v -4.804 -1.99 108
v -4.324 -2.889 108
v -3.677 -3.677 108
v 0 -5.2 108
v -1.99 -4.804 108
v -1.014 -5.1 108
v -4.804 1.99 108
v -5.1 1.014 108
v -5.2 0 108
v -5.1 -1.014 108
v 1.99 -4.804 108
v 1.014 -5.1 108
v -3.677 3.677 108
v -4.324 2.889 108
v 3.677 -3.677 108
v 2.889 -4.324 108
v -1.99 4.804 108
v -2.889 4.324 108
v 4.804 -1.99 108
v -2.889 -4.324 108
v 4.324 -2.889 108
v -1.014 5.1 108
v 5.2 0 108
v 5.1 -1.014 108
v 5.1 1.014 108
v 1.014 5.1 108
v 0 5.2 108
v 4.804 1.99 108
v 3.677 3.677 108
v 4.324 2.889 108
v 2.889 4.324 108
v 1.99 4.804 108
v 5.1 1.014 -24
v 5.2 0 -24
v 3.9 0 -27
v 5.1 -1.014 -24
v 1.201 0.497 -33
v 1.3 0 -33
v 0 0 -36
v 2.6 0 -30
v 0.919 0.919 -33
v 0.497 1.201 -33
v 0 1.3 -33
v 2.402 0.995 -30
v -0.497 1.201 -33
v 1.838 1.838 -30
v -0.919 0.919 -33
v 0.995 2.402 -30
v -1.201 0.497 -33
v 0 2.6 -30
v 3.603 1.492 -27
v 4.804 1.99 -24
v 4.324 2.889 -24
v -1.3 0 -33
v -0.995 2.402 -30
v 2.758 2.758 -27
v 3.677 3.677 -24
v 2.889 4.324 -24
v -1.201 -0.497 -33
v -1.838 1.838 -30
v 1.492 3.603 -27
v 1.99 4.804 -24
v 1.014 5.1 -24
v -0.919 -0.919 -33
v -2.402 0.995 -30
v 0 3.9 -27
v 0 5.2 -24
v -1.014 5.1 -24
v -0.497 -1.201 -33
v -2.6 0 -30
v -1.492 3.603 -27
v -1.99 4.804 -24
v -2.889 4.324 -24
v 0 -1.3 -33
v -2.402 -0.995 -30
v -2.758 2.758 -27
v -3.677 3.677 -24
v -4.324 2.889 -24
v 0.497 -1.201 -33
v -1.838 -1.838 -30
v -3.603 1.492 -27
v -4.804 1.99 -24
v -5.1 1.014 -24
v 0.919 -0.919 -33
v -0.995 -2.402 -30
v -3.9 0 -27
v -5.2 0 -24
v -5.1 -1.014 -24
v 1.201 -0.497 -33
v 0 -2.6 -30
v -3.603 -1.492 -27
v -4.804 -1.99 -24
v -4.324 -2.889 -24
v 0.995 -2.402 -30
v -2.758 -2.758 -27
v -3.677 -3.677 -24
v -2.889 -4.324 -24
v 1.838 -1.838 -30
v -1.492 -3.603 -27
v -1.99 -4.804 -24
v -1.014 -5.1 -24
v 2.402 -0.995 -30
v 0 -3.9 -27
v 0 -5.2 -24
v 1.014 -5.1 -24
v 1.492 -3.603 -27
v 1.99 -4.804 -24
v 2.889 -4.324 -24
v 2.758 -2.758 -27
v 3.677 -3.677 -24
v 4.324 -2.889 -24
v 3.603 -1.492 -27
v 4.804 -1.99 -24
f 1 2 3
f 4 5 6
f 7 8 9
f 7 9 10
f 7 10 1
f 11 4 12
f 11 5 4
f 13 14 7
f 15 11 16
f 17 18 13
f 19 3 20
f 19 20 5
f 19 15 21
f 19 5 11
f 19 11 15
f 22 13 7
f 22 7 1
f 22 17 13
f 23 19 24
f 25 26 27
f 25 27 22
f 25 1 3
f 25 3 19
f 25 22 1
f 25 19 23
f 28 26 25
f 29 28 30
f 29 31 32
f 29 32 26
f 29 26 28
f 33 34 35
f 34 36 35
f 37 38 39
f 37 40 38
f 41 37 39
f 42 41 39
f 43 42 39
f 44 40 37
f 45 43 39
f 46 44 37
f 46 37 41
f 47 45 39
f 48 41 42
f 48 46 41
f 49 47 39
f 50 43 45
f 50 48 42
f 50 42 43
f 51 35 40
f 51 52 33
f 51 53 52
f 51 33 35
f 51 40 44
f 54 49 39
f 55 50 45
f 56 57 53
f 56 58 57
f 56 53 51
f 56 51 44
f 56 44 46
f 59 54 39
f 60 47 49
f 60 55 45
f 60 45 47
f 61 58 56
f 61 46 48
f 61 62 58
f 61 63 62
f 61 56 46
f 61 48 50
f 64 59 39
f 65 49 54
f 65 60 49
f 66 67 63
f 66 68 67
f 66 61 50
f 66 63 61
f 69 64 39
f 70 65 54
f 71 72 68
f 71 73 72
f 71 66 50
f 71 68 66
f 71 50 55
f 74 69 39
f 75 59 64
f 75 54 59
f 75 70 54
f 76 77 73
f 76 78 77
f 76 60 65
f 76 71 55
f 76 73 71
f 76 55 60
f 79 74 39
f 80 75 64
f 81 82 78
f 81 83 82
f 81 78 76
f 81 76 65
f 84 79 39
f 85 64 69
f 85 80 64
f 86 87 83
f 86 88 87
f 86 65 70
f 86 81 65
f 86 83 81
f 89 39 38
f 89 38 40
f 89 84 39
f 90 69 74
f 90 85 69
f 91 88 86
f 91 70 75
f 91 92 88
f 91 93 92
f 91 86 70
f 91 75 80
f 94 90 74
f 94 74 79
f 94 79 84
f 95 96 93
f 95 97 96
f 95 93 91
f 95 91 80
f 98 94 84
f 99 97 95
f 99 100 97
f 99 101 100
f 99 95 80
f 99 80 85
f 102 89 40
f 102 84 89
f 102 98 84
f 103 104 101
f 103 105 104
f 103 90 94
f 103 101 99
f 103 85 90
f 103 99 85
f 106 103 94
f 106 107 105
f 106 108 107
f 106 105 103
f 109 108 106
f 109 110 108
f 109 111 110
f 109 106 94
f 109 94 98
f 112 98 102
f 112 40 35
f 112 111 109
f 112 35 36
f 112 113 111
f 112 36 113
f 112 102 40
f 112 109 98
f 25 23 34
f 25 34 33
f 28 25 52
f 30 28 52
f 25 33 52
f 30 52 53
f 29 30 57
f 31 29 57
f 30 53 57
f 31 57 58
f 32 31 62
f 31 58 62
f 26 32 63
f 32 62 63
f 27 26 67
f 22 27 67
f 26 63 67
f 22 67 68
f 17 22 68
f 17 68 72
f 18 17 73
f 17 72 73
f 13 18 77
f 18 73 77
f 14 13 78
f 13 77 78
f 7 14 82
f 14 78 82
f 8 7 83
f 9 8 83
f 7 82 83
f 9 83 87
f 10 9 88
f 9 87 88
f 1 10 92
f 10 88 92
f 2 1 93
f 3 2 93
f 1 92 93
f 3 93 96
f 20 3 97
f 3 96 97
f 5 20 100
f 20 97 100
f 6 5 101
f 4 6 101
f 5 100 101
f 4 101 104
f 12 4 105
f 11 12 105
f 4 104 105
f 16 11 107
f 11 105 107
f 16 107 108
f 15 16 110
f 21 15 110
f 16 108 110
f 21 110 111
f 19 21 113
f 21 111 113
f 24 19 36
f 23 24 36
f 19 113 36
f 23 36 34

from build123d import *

# Parameters (mm, degrees)
CYLINDER_R     = 5.2
CYLINDER_DEPTH = 132


with BuildPart() as cono:
    # Cone → Cone (revolve)
    with BuildSketch(Plane(origin=(0, 0, -12), x_dir=(1, 0, 0), z_dir=(0, -1, 0))):
        Polygon((0, 0), (5.2, 12), (0, 12), align=None)
    revolve(axis=Axis((0, 0, -12), (0, 0, 1)))


with BuildPart() as boligrafo001:
    # Cylinder → Cylinder (new body)
    with BuildSketch(Plane.XY):
        Circle(CYLINDER_R)
    extrude(amount=CYLINDER_DEPTH)

    # Fusion004: union Cono
    add(cono.part)


with BuildPart() as boligrafo001_1:
    # Fusion004 placement: moved
    add(boligrafo001.part.moved(Location((0, 0, -24))))


solid = boligrafo001_1.part
